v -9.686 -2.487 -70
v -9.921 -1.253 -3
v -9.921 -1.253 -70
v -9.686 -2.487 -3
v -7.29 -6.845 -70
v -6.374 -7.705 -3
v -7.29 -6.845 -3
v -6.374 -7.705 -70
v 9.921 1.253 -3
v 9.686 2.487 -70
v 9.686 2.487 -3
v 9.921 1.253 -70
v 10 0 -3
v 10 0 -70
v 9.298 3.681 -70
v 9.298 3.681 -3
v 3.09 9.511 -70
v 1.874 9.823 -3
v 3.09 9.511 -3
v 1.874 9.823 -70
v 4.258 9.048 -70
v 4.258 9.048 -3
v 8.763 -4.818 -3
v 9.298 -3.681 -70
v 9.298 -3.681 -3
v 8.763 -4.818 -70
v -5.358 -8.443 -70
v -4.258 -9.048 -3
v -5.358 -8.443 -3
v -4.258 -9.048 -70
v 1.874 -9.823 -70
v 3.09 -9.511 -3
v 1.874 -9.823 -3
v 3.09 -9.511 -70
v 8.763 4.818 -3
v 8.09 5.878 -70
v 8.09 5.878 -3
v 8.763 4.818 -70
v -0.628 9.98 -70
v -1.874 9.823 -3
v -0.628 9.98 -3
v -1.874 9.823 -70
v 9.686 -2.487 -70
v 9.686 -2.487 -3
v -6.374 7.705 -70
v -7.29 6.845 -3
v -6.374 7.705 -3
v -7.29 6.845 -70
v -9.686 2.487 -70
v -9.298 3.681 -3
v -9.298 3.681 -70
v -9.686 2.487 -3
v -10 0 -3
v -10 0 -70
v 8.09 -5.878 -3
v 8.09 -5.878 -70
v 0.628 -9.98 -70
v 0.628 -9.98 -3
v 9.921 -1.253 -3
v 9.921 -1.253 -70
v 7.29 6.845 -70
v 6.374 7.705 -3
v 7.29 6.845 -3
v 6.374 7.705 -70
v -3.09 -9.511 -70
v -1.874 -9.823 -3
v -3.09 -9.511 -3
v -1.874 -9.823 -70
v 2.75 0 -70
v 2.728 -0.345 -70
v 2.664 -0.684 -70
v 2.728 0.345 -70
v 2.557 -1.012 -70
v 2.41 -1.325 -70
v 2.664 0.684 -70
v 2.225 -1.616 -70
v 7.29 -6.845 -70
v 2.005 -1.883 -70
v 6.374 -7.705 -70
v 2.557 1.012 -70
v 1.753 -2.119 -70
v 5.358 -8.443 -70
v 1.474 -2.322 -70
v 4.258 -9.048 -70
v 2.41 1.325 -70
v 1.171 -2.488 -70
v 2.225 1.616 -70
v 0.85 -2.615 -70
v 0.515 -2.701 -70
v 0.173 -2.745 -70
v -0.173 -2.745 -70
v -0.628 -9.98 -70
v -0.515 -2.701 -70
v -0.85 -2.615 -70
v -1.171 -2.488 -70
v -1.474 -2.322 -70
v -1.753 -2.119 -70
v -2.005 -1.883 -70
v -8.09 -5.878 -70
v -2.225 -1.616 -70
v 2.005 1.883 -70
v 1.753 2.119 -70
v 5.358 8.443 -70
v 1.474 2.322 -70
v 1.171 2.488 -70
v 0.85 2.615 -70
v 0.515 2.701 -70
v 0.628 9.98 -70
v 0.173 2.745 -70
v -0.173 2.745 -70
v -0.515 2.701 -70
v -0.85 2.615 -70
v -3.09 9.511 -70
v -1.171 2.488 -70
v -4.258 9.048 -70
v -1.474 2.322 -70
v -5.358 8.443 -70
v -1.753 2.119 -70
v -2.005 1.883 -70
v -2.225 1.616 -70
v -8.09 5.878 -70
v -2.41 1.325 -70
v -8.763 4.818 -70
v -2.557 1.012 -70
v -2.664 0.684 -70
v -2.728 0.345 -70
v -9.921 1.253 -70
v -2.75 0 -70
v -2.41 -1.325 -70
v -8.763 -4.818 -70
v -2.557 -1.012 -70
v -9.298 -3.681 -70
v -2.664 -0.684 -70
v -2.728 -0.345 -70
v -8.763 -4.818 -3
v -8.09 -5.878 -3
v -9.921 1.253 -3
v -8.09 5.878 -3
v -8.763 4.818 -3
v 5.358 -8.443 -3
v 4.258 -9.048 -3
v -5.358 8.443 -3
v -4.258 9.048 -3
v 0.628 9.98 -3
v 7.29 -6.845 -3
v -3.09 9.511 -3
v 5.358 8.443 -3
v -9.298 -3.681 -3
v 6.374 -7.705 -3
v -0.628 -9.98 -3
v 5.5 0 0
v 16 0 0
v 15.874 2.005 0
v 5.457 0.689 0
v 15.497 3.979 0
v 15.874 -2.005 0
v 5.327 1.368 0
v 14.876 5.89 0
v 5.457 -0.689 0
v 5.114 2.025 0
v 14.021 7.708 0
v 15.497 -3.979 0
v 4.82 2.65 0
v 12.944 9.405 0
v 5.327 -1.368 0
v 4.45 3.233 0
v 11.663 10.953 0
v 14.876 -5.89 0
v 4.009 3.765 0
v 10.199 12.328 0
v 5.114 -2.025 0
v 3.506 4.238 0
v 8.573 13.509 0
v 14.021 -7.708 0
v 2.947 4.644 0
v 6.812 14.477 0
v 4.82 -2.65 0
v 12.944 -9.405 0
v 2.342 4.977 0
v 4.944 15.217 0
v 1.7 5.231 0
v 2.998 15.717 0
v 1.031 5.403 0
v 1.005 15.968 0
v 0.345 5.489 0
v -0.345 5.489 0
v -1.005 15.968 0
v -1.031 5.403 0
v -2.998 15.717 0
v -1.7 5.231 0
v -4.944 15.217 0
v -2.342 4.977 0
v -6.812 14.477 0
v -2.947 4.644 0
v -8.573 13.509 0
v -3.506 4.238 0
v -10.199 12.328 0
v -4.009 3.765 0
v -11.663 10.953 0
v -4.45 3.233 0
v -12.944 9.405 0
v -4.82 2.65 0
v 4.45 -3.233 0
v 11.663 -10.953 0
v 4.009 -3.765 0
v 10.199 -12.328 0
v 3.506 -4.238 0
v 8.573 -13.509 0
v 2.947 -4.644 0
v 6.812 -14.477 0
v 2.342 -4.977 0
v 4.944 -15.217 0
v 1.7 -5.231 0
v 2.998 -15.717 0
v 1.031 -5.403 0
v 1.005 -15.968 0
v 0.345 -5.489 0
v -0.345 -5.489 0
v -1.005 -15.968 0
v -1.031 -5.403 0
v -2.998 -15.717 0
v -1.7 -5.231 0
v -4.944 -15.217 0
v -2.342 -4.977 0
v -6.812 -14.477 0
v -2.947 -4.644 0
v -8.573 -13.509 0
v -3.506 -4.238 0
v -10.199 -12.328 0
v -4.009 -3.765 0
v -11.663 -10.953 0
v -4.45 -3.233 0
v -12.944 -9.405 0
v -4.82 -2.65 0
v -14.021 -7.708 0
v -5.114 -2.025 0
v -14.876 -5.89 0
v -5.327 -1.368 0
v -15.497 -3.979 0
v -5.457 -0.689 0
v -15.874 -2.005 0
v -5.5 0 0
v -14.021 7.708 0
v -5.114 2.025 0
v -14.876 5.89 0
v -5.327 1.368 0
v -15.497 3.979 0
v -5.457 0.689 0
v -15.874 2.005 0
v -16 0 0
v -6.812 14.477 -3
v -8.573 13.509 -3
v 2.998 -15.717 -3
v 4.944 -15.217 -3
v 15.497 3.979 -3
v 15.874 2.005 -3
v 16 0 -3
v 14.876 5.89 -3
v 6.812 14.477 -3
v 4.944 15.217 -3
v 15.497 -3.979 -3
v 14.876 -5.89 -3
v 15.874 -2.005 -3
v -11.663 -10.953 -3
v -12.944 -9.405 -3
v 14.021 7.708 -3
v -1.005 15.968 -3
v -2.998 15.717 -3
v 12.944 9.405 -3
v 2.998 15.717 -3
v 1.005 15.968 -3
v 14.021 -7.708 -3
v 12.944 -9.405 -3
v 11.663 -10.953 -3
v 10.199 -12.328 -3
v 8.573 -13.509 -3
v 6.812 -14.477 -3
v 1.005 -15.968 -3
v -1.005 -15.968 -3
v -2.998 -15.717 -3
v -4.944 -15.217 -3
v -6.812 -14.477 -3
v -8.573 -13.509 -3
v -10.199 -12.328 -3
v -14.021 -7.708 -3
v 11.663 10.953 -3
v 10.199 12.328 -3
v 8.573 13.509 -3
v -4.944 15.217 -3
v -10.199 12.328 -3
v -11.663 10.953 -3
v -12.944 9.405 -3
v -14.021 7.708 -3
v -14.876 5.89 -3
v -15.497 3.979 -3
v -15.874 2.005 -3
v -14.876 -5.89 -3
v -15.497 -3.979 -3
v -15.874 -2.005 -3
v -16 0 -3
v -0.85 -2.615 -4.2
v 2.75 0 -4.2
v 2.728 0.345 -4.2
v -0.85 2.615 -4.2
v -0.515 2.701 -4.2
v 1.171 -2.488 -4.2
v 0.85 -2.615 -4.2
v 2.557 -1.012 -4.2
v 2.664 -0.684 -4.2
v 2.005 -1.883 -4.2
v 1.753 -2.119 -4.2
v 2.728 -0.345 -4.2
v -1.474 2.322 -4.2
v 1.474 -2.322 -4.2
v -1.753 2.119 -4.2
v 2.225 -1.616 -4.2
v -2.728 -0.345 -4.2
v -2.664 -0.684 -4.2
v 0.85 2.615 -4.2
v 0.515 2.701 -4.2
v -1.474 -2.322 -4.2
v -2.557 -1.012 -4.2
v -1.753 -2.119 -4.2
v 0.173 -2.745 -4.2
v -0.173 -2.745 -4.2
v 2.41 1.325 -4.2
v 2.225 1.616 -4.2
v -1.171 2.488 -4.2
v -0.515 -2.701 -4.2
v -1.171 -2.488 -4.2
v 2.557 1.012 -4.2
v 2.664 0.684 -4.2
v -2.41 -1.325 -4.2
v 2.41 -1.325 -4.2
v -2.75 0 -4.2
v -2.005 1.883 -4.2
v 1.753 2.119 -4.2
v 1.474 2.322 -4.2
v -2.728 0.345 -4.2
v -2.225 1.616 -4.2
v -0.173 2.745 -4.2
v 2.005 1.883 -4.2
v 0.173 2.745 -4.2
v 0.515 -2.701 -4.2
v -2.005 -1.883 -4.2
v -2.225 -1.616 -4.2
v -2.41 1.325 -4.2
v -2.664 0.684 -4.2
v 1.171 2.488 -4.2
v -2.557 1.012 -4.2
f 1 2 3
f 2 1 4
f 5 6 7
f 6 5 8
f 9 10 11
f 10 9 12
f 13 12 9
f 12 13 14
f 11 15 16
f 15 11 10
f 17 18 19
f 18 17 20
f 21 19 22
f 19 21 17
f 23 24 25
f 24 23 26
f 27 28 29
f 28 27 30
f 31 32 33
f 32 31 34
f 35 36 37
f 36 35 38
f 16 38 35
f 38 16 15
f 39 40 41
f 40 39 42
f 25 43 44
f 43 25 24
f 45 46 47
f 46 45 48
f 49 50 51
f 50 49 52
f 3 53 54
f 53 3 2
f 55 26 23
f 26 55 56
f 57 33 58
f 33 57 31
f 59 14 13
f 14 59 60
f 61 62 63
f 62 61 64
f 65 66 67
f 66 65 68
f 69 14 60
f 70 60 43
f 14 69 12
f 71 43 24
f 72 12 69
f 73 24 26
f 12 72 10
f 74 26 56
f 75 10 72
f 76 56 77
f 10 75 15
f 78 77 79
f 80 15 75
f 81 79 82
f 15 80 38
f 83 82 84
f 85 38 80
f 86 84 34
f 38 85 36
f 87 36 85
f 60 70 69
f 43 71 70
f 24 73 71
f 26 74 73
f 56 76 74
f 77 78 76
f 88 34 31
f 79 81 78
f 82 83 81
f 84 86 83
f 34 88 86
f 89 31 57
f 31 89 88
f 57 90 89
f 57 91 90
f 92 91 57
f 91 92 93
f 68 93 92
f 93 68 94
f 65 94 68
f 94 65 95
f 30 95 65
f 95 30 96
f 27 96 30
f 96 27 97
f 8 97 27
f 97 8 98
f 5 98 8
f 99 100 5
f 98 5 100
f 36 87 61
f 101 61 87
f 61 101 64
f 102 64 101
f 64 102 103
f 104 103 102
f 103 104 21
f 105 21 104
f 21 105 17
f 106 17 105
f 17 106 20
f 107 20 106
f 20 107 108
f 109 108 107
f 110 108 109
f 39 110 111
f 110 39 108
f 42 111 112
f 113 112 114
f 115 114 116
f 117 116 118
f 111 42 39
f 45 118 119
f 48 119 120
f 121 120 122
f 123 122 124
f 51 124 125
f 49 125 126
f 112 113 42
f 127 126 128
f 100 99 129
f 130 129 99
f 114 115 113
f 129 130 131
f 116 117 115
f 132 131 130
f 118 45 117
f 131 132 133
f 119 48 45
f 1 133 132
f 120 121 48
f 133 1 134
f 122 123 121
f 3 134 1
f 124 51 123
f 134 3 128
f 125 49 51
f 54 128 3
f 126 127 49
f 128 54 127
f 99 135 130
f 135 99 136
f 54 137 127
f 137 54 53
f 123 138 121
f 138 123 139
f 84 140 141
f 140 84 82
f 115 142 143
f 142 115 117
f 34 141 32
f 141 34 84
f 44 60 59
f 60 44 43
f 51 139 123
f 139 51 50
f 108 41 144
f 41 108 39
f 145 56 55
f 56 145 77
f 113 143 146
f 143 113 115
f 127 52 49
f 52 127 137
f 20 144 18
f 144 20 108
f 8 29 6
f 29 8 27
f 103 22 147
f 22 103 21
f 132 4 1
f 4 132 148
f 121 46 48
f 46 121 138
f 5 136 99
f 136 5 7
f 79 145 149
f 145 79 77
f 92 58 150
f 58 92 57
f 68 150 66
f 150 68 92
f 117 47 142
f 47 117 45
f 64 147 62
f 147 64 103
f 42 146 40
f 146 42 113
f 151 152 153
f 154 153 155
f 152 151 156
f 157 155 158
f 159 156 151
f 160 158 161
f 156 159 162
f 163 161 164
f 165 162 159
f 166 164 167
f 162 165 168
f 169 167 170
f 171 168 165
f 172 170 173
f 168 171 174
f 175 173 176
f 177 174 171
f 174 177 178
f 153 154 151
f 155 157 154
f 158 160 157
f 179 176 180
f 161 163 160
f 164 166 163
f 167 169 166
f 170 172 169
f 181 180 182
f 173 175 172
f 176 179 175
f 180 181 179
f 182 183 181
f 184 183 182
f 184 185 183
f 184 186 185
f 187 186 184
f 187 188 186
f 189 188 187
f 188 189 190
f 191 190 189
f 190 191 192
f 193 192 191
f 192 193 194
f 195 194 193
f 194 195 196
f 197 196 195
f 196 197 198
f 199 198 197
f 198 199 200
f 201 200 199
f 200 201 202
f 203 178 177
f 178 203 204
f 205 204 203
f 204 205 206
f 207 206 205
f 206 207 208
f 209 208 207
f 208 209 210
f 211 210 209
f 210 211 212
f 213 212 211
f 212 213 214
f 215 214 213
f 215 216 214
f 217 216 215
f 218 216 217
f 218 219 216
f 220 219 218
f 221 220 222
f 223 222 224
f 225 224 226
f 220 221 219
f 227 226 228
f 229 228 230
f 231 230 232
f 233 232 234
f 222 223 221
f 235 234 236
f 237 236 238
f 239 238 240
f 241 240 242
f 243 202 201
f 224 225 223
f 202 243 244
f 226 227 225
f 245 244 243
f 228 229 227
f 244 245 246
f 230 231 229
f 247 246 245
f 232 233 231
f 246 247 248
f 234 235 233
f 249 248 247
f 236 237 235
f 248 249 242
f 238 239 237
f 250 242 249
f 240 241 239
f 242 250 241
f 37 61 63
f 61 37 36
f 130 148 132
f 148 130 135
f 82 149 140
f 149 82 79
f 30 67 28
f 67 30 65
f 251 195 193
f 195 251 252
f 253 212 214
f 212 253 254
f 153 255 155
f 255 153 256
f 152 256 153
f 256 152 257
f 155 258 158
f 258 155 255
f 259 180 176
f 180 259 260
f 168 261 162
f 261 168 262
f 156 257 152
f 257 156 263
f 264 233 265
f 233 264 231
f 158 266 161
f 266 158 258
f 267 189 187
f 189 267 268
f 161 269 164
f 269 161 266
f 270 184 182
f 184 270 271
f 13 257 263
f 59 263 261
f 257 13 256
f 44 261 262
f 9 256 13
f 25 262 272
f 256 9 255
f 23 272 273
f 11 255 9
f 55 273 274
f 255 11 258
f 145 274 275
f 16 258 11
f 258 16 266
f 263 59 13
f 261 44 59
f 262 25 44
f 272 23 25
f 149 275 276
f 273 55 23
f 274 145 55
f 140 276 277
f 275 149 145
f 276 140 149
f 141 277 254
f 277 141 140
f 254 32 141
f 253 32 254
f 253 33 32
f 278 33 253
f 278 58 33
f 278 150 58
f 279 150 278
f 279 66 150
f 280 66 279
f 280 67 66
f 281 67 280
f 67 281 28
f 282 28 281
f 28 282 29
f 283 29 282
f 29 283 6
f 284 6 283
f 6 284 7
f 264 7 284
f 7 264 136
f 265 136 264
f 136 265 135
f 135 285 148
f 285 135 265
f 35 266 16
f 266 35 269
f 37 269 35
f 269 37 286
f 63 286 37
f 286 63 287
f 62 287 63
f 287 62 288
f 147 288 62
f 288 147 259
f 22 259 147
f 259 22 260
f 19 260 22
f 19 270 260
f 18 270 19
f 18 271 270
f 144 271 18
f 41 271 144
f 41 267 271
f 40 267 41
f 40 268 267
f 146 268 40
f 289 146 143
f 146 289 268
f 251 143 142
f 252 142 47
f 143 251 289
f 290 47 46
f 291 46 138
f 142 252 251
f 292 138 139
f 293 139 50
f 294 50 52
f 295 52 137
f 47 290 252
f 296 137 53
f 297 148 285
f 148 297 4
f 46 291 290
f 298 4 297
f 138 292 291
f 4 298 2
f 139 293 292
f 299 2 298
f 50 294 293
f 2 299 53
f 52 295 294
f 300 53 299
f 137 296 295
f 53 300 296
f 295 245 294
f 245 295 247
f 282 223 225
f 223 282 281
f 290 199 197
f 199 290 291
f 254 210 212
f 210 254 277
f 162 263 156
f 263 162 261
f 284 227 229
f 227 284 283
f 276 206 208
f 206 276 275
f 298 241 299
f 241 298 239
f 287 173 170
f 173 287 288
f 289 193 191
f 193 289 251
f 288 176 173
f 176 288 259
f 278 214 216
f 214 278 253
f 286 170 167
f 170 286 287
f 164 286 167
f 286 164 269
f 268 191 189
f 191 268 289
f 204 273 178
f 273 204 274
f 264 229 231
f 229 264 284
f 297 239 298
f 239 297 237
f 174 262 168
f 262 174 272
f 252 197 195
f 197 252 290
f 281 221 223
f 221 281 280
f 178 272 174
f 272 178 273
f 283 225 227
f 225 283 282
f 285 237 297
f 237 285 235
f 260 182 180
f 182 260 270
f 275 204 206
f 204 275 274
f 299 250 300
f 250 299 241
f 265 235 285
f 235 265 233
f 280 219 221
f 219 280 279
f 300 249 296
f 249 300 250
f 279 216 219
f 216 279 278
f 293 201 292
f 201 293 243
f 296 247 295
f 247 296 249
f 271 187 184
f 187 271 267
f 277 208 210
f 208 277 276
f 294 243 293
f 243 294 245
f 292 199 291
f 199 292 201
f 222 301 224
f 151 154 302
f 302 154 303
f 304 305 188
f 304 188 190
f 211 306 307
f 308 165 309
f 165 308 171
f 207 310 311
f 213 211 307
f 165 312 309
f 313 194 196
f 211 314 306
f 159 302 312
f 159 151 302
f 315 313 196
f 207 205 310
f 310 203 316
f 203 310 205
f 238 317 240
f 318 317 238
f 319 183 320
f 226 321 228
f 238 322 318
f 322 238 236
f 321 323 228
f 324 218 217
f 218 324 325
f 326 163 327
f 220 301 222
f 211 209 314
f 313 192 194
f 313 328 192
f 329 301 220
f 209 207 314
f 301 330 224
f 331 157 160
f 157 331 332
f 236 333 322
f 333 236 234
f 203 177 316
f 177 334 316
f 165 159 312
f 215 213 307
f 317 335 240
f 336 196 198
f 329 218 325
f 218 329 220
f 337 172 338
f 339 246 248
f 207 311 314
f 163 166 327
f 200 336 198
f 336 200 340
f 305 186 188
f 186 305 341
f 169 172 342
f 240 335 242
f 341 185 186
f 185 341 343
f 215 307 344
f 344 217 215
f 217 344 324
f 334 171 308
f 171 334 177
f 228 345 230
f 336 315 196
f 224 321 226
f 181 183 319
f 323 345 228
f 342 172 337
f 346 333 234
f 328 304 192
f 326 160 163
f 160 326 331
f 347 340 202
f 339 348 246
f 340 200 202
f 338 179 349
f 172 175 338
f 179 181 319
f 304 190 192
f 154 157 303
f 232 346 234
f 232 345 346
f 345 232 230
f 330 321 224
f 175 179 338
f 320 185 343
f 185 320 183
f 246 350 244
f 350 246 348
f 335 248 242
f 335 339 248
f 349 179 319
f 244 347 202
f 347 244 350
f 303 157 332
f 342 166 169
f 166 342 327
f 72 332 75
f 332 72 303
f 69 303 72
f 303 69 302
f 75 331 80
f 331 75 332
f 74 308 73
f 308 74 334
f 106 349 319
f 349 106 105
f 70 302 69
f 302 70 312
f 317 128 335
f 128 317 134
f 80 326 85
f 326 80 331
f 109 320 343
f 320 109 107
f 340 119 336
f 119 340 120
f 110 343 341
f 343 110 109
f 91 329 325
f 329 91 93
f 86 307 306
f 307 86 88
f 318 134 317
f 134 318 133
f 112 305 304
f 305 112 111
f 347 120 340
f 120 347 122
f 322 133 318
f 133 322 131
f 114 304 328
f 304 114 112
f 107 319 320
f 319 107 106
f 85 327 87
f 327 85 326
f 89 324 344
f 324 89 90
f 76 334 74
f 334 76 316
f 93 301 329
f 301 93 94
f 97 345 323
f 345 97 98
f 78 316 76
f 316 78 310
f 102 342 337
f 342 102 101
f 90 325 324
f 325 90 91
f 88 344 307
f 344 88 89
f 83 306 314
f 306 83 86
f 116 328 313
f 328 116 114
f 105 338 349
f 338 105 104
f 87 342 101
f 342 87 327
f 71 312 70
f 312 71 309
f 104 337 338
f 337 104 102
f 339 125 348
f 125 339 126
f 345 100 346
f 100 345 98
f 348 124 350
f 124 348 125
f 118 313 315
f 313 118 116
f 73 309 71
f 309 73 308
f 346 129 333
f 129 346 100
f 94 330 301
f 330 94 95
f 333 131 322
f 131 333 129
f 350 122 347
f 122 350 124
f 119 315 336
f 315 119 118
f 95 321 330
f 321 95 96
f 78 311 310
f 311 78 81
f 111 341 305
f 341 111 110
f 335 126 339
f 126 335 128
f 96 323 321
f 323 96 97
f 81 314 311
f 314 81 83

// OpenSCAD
$fn = 50;


difference() {
	union() {
		translate(v = [0, 0, -70.0000000000]) {
			cylinder(h = 70, r = 10.0000000000);
		}
		translate(v = [0, 0, -3.0000000000]) {
			cylinder(h = 3, r = 16.0000000000);
		}
	}
	union() {
		translate(v = [0, 0, 0]) {
			rotate(a = [0, 0, 0]) {
				difference() {
					union() {
						#translate(v = [0, 0, -70.0000000000]) {
							cylinder(h = 70, r = 2.2500000000);
						}
						#translate(v = [0, 0, -4.2000000000]) {
							cylinder(h = 4.2000000000, r = 10.0000000000, r1 = 2.7500000000, r2 = 5.5000000000);
						}
						#translate(v = [0, 0, -70.0000000000]) {
							cylinder(h = 70, r = 2.7500000000);
						}
						#translate(v = [0, 0, -70.0000000000]) {
							cylinder(h = 70, r = 2.2500000000);
						}
					}
					union();
				}
			}
		}
	}
}
